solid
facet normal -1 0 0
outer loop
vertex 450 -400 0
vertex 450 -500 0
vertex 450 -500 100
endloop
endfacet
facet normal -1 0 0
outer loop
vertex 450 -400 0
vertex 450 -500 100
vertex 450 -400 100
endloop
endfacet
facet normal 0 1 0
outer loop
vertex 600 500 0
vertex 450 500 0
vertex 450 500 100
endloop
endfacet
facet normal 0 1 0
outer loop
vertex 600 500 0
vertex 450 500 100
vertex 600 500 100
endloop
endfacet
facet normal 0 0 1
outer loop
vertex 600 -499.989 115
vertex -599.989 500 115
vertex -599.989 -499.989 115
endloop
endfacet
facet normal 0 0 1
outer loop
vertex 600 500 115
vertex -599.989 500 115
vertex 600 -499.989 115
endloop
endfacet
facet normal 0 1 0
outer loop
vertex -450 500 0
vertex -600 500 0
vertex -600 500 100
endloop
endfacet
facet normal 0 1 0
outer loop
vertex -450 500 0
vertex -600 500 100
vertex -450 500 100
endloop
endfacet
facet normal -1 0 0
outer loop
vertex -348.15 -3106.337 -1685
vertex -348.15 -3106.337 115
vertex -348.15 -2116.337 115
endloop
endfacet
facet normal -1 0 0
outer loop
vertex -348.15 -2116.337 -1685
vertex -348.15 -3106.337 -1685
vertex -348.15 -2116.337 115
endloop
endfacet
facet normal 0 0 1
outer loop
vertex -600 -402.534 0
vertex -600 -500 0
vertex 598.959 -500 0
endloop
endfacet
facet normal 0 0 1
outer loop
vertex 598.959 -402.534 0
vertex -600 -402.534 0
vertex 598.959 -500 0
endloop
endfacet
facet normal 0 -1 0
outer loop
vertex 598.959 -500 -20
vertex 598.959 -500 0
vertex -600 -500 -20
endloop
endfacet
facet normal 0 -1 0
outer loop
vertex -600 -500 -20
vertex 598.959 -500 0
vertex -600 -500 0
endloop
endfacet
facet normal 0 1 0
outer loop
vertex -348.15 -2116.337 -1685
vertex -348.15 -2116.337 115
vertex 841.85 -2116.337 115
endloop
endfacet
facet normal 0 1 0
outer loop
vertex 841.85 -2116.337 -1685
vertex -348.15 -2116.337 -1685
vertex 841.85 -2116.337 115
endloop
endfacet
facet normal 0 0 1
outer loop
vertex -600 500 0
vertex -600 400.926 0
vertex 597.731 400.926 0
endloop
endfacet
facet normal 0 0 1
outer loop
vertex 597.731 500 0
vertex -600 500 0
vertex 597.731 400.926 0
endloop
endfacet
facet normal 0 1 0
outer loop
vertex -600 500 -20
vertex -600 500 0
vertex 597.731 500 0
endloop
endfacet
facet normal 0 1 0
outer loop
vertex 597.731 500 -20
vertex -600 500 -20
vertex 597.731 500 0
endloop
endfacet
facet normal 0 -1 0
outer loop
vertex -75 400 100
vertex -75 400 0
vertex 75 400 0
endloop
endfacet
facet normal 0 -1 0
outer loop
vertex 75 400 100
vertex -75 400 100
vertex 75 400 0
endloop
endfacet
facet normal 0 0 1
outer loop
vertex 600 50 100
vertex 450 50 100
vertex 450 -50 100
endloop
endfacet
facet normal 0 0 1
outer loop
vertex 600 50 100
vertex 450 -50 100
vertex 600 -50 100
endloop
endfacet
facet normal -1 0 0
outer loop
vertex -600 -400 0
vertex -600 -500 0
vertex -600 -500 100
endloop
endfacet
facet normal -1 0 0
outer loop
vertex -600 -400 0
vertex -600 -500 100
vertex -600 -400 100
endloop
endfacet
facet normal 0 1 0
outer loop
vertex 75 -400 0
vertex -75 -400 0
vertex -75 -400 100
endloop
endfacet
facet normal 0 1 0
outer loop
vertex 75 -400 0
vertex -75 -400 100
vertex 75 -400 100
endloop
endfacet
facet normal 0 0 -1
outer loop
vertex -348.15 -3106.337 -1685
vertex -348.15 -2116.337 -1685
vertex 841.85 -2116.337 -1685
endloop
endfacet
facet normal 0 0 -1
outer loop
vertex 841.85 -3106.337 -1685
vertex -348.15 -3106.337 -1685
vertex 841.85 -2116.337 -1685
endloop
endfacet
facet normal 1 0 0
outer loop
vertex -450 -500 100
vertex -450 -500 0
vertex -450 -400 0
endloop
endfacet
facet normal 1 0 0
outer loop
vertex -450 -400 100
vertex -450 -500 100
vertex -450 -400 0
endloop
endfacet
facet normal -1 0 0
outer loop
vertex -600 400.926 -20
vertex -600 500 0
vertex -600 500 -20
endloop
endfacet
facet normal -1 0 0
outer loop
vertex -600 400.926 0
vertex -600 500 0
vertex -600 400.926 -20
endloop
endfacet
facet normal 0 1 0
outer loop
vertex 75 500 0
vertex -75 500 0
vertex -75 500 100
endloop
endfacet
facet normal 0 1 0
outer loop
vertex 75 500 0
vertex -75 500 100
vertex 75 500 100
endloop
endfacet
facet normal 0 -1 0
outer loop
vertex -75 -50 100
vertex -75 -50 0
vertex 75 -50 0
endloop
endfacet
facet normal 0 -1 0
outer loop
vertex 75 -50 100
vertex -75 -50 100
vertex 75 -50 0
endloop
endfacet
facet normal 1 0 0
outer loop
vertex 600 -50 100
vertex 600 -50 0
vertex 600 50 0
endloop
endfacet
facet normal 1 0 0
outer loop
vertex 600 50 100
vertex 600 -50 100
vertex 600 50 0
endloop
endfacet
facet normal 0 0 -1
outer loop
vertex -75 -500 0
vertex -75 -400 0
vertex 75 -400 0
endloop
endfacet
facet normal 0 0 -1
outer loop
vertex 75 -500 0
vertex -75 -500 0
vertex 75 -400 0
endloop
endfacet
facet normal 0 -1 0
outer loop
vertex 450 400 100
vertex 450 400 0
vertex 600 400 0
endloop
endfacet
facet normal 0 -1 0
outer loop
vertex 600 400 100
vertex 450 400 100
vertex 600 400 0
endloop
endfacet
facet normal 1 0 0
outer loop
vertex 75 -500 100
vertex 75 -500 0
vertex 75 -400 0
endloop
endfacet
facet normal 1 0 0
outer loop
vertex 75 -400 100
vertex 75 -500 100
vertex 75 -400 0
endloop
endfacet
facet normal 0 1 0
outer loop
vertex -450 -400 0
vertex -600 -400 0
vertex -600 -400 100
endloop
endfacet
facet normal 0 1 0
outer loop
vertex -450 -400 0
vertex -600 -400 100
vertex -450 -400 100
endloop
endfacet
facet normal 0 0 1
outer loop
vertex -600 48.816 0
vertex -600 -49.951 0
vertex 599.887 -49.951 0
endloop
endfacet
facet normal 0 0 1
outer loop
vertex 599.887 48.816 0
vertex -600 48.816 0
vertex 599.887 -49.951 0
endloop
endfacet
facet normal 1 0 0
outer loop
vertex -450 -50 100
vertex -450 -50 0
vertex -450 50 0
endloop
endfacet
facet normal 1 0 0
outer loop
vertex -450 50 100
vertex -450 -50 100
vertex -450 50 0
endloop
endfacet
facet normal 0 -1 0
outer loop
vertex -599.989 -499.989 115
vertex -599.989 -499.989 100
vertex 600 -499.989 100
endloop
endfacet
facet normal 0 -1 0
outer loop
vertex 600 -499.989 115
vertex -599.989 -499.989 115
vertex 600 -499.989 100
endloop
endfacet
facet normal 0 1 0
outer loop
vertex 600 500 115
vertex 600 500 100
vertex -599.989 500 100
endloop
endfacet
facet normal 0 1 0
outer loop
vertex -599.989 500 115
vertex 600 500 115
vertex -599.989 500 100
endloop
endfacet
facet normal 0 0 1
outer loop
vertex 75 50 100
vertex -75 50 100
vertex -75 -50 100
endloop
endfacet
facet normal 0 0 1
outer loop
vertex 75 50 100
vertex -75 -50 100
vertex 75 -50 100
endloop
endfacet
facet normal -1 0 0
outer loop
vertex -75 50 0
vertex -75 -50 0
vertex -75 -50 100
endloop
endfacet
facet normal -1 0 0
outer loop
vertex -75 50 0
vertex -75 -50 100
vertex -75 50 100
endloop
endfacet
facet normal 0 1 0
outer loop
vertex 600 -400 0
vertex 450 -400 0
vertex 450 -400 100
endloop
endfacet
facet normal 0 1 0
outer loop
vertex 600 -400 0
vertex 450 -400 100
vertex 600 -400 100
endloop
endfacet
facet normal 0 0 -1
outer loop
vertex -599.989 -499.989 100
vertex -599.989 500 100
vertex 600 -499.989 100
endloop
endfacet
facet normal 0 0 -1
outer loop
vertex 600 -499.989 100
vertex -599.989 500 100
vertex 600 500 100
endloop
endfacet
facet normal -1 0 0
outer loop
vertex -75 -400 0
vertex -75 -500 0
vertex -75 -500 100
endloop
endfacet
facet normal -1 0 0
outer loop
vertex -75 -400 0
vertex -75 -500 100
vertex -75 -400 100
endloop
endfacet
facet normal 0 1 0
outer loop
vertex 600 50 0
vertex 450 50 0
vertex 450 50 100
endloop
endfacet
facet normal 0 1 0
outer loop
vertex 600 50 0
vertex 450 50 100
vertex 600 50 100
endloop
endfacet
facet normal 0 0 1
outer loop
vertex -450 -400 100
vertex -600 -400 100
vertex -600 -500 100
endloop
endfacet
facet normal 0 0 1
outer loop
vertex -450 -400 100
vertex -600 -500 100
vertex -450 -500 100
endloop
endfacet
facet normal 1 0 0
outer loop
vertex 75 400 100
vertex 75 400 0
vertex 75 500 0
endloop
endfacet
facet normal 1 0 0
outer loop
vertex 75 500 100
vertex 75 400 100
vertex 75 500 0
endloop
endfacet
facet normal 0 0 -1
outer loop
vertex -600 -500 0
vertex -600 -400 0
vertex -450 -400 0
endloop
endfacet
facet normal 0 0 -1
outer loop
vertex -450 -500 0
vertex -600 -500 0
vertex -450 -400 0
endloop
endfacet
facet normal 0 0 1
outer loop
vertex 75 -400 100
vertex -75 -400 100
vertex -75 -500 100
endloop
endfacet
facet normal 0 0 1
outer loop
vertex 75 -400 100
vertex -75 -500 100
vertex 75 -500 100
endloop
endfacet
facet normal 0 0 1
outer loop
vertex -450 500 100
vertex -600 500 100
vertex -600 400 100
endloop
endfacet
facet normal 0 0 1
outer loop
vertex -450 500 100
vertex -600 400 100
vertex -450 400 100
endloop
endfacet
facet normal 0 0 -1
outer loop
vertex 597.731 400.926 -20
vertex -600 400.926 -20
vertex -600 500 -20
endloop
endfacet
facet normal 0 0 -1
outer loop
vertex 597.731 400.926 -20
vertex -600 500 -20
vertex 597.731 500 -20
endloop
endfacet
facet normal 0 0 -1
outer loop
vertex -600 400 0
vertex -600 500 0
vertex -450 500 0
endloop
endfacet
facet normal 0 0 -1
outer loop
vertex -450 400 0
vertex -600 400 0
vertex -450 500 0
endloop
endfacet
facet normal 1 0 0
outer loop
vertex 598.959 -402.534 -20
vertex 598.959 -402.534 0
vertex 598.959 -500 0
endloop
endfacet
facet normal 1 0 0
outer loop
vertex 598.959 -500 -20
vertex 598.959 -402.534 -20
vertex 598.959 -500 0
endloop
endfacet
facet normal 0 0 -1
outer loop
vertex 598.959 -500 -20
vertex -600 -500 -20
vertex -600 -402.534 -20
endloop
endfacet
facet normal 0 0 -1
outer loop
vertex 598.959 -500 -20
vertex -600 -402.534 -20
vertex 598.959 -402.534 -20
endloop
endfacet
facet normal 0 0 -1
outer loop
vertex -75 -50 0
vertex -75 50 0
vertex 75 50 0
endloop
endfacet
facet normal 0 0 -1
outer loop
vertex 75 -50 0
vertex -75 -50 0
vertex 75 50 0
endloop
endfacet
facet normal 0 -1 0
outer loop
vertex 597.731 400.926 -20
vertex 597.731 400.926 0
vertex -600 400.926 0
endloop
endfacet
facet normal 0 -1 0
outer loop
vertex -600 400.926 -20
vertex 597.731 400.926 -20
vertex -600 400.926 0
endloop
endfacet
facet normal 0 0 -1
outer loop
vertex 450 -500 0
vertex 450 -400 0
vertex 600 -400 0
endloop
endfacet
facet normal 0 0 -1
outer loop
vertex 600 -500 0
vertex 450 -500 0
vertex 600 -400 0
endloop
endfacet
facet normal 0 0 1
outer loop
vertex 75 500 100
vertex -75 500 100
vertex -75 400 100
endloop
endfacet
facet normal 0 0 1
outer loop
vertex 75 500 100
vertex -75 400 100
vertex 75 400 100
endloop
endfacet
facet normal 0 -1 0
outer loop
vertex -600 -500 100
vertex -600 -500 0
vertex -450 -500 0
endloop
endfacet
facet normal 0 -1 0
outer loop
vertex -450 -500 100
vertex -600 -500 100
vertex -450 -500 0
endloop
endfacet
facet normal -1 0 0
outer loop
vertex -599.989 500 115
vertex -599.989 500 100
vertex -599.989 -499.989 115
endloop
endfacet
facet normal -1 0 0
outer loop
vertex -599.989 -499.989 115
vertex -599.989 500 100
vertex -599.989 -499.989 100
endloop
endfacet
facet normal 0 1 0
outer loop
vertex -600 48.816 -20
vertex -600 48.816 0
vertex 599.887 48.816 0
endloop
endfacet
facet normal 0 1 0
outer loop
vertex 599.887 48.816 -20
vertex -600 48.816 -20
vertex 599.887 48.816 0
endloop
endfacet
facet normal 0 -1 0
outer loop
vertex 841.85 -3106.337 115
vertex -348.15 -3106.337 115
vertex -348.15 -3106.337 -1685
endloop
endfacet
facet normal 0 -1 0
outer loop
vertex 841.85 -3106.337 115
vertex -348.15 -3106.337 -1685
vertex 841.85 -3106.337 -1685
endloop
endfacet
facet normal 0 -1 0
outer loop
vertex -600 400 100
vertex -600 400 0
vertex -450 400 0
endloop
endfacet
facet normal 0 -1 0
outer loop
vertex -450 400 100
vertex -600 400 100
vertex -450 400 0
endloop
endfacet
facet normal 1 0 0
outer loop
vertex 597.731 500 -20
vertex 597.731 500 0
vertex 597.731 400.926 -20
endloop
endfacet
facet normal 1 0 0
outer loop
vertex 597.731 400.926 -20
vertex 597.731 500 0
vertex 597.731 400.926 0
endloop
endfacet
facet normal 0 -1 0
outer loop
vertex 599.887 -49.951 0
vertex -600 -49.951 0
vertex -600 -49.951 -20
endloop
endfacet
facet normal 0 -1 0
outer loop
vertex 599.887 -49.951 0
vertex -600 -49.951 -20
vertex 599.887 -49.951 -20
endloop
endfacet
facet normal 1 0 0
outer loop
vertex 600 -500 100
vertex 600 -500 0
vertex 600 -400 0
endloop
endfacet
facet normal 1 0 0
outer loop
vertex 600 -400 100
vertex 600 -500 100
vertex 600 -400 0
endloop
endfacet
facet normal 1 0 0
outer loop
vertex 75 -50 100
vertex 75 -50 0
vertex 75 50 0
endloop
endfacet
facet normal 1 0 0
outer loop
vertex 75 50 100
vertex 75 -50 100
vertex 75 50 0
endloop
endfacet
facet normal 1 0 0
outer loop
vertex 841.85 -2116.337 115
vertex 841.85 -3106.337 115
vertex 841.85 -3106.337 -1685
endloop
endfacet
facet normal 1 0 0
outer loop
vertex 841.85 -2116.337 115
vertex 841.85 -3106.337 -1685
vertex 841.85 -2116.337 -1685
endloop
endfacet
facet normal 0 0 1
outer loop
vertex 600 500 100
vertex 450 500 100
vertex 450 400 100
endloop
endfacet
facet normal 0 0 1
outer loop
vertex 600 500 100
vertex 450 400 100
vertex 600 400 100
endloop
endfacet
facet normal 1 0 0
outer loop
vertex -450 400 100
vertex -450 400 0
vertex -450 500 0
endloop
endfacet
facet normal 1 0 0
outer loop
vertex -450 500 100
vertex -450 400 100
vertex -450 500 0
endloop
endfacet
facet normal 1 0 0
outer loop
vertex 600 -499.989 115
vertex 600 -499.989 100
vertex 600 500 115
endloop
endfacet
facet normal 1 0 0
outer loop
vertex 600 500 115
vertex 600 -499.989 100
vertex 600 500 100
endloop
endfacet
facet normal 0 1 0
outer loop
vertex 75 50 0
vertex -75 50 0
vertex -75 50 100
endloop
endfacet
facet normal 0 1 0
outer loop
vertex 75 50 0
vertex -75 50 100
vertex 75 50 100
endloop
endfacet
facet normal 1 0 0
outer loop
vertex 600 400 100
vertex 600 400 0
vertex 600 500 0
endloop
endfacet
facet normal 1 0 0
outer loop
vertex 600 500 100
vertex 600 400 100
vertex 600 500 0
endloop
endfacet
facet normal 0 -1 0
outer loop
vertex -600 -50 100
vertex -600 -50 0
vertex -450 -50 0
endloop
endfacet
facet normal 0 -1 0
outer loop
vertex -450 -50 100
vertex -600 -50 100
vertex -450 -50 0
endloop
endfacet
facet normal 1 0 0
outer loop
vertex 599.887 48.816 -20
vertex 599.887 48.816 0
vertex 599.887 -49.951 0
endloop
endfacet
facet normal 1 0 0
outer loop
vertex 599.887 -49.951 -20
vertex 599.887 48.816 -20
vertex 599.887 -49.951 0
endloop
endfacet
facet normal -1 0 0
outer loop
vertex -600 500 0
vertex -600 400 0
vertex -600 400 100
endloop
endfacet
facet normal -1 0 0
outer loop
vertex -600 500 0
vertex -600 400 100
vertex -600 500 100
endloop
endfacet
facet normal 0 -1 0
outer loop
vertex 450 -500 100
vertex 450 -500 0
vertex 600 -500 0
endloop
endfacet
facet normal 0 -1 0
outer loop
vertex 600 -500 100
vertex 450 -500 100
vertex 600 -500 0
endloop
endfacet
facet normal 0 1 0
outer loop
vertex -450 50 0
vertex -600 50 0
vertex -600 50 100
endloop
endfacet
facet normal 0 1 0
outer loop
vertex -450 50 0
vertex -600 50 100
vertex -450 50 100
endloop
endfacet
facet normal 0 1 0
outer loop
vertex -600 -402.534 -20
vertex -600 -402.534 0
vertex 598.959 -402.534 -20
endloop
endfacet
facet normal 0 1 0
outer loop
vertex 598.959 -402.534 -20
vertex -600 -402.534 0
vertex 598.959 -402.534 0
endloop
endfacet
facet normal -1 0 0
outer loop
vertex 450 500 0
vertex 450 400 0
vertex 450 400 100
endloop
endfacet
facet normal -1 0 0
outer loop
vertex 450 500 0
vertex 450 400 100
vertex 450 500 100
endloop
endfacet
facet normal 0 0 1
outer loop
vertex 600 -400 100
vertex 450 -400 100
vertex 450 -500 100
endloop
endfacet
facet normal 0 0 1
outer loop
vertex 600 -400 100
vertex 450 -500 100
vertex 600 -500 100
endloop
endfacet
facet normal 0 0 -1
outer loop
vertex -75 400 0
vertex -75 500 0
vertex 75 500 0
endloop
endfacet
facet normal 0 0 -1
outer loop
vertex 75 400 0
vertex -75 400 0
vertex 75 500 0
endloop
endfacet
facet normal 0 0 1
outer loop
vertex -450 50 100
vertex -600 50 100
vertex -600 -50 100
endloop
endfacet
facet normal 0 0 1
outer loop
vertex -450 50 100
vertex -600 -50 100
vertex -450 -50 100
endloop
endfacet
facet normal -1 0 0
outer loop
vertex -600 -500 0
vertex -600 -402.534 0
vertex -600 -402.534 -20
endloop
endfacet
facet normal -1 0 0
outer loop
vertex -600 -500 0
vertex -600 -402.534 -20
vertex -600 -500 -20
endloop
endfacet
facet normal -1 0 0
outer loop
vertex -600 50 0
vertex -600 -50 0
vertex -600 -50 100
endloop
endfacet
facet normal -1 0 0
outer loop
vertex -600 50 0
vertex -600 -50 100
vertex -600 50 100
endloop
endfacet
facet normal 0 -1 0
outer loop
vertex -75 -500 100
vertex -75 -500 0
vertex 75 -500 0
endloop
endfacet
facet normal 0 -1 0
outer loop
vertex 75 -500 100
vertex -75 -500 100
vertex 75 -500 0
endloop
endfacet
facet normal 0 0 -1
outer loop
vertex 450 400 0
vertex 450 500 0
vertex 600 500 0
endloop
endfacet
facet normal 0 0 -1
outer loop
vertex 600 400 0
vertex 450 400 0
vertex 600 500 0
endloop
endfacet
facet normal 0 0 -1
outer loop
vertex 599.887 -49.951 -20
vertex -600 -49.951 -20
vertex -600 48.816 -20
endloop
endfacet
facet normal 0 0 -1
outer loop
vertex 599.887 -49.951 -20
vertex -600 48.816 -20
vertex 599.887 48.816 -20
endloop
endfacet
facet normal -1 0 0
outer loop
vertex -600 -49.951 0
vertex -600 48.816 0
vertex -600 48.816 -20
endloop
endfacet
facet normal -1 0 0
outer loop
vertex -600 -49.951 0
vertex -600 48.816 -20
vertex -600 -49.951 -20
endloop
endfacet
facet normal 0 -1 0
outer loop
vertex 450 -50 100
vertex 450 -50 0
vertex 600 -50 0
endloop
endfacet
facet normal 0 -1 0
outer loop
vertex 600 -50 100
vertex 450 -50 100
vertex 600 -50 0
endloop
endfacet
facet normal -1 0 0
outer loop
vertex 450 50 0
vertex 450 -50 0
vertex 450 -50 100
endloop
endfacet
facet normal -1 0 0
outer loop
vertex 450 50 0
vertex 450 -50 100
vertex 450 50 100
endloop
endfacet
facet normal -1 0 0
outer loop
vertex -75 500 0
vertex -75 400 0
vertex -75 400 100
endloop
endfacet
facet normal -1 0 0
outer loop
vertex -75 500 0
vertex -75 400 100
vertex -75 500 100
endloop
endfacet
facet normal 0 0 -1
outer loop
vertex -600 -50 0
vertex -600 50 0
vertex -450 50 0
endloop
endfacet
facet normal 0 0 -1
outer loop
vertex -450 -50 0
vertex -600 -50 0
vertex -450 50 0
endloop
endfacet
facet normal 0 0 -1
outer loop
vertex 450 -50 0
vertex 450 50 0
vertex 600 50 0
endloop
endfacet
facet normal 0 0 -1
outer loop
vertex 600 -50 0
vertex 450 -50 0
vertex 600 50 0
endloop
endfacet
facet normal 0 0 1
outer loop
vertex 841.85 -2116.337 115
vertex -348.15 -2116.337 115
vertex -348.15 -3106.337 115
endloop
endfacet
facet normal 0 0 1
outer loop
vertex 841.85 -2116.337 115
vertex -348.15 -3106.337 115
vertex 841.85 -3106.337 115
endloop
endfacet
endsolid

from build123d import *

# Parameters (mm, degrees)
F0_W     = 150
F0_H     = 100
F1_DEPTH = 100
F2_W     = 150
F2_H     = 100
F3_DEPTH = 15
F4_W     = 150
F4_H     = 97.4655151367
F4_W_2   = 1048.9593863487
F5_DEPTH = 20
F6_W     = 1199.8871326447
F6_H     = 98.7667553127
F7_DEPTH = 20
F6_W_2   = 1047.7310538292
F6_H_2   = 99.0744531155
F6_W_3   = 150
F8_W     = 1190
F8_H     = 990
F9_DEPTH = 1800


with BuildPart() as f1:
    # F0 (on Top) → F1 (new body)
    with BuildSketch(Plane.XY):
        with Locations((0, -450)):
            Rectangle(F0_W, F0_H)
    extrude(amount=F1_DEPTH)


with BuildPart() as f1b:
    # F0 (on Top) → F1, piece 2 (new body)
    with BuildSketch(Plane.XY):
        with Locations((-525, -450)):
            Rectangle(F0_W, F0_H)
    extrude(amount=F1_DEPTH)


with BuildPart() as f1c:
    # F0 (on Top) → F1, piece 3 (new body)
    with BuildSketch(Plane.XY):
        with Locations((-525, 0)):
            Rectangle(F0_W, F0_H)
    extrude(amount=F1_DEPTH)


with BuildPart() as f1d:
    # F0 (on Top) → F1, piece 4 (new body)
    with BuildSketch(Plane.XY):
        with Locations((-525, 450)):
            Rectangle(F0_W, F0_H)
    extrude(amount=F1_DEPTH)


with BuildPart() as f1e:
    # F0 (on Top) → F1, piece 5 (new body)
    with BuildSketch(Plane.XY):
        with Locations((0, 450)):
            Rectangle(F0_W, F0_H)
    extrude(amount=F1_DEPTH)


with BuildPart() as f1f:
    # F0 (on Top) → F1, piece 6 (new body)
    with BuildSketch(Plane.XY):
        Rectangle(F0_W, F0_H)
    extrude(amount=F1_DEPTH)


with BuildPart() as f1g:
    # F0 (on Top) → F1, piece 7 (new body)
    with BuildSketch(Plane.XY):
        with Locations((525, 0)):
            Rectangle(F0_W, F0_H)
    extrude(amount=F1_DEPTH)


with BuildPart() as f1h:
    # F0 (on Top) → F1, piece 8 (new body)
    with BuildSketch(Plane.XY):
        with Locations((525, 450)):
            Rectangle(F0_W, F0_H)
    extrude(amount=F1_DEPTH)


with BuildPart() as f1i:
    # F0 (on Top) → F1, piece 9 (new body)
    with BuildSketch(Plane.XY):
        with Locations((525, -450)):
            Rectangle(F0_W, F0_H)
    extrude(amount=F1_DEPTH)


with BuildPart() as f3:
    # F2 (on face) → F3 (new body)
    with BuildSketch(Plane.XY.offset(100)):
        Polygon((450, 400), (450, 500), (-599.9894738197, 500), (-599.9894738197, -499.98909235), (600, -499.98909235), (600, 400), align=None)
        with Locations((525, 450)):
            Rectangle(F2_W, F2_H)
    extrude(amount=F3_DEPTH)


with BuildPart() as f5:
    # F4 (on face) → F5 (new body)
    with BuildSketch(Plane(origin=(0, 0, 0), x_dir=(1, 0, 0), z_dir=(0, 0, -1))):
        with Locations((-525, 451.2672424316)):
            Rectangle(F4_W, F4_H)
        with Locations((74.4796931744, 451.2672424316)):
            Rectangle(F4_W_2, F4_H)
    extrude(amount=F5_DEPTH)


with BuildPart() as f7:
    # F6 (on face) → F7 (new body)
    with BuildSketch(Plane(origin=(0, 0, 0), x_dir=(1, 0, 0), z_dir=(0, 0, -1))):
        with Locations((-0.0564336777, 0.5671847612)):
            Rectangle(F6_W, F6_H)
    extrude(amount=F7_DEPTH)


with BuildPart() as f7b:
    # F6 (on face) → F7, piece 2 (new body)
    with BuildSketch(Plane(origin=(0, 0, 0), x_dir=(1, 0, 0), z_dir=(0, 0, -1))):
        with Locations((73.8655269146, -450.4627734423)):
            Rectangle(F6_W_2, F6_H_2)
        with Locations((-525, -450.4627734423)):
            Rectangle(F6_W_3, F6_H_2)
    extrude(amount=F7_DEPTH)


with BuildPart() as f9:
    # F8 (on face) → F9 (new body)
    with BuildSketch(Plane.XY.offset(115)):
        with Locations((246.8504321575, -2611.3373088837)):
            Rectangle(F8_W, F8_H)
    extrude(amount=-F9_DEPTH)


solid = Compound([f1.part, f1b.part, f1c.part, f1d.part, f1e.part, f1f.part, f1g.part, f1h.part, f1i.part, f3.part, f5.part, f7.part, f7b.part, f9.part])
